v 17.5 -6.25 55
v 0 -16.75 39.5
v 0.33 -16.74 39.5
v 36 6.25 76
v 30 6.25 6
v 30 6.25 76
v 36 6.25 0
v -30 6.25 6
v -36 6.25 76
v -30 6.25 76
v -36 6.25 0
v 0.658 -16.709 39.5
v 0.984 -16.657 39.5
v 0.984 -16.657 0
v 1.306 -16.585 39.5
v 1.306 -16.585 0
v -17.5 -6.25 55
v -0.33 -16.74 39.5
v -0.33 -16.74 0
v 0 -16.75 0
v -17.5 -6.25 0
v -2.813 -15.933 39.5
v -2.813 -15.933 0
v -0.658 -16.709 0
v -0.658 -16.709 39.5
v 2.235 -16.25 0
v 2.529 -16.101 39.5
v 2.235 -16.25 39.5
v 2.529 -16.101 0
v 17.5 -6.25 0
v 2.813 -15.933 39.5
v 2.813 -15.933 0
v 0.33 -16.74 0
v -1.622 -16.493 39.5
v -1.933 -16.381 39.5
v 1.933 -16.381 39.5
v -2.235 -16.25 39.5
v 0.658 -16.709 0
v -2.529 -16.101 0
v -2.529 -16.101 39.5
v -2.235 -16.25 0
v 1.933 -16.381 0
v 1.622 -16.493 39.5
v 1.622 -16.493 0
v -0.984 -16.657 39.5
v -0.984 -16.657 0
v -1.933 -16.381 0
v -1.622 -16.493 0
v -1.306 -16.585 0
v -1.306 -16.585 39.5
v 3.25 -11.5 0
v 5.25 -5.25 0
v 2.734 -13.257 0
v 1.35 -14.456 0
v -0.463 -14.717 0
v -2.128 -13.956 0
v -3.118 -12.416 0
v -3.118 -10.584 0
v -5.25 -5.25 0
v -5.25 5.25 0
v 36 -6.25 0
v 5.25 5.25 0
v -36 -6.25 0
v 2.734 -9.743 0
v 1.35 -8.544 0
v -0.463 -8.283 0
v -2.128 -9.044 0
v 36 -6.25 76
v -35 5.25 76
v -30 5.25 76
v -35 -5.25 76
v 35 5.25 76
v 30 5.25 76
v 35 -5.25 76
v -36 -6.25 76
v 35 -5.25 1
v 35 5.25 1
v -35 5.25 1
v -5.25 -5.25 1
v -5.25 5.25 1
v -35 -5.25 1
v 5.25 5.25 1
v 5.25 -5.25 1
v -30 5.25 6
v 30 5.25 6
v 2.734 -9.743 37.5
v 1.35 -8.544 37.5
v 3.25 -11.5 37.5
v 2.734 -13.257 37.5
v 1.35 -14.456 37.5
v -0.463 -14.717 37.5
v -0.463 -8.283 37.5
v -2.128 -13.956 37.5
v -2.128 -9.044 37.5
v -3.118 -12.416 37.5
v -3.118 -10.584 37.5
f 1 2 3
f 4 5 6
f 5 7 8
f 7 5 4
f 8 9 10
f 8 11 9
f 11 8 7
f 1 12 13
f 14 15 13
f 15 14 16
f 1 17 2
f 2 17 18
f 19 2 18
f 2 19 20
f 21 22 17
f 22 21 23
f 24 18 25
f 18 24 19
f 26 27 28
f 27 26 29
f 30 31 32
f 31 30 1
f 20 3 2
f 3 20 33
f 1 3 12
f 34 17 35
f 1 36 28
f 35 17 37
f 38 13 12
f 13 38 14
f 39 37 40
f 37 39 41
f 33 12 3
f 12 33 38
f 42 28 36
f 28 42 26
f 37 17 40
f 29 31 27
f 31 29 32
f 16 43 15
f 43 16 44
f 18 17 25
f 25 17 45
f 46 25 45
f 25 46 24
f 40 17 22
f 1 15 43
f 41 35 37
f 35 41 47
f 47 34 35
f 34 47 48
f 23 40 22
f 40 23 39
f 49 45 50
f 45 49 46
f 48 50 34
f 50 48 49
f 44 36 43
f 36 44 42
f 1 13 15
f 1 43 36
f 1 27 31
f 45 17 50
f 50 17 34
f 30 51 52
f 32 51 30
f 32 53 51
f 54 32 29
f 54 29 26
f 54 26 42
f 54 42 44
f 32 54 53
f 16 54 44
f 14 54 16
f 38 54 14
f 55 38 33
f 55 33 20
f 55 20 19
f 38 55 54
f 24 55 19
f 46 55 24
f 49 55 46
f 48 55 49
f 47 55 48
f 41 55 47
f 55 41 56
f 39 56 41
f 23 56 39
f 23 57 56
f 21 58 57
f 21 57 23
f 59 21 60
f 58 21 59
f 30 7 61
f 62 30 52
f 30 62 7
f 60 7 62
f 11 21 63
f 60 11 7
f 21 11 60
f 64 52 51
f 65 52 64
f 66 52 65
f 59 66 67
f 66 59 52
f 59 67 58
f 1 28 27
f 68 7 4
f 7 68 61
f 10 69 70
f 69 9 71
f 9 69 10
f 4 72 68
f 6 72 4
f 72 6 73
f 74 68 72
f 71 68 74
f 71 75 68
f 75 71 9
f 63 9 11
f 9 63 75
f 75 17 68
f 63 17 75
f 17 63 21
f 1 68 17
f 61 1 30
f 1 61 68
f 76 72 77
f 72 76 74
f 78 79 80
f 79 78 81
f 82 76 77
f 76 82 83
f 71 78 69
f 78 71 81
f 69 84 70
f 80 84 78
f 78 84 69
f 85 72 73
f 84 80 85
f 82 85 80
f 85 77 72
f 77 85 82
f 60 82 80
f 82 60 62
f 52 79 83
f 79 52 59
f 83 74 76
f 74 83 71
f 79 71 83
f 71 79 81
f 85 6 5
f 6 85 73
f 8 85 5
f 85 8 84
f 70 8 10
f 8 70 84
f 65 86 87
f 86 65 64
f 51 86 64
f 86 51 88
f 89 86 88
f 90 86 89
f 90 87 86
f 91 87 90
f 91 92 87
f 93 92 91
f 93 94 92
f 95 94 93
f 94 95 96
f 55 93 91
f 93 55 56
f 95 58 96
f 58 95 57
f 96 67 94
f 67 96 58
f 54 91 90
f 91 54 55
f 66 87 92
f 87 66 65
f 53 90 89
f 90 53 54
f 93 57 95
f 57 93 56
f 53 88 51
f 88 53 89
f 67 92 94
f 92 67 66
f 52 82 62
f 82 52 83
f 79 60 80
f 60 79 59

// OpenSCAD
/* a phone-on-a-stick holder for a flame */
width=70;
depth=10.5;
height=75;
thickness=1;
flange=5;
shaft_dia=6.5;
shaft_thickness=2;
module holder(){
  difference() {
    union() {
      hull() {
        translate([0,(-(depth+2*thickness)/2)-(shaft_dia/2)-shaft_thickness, 0]) {
          cylinder(r=(shaft_dia/2)+shaft_thickness, h=(height/2)+shaft_thickness, $fn=100);
        }
        translate([-width/4, -(depth+2*thickness)/2,0]) cube([width/2, depth+2*thickness, (height/2)+(width/4)]);
      }
      translate([-(width+2*thickness)/2, -(depth+2*thickness)/2,0]) cube([width+2*thickness, depth+2*thickness, height+thickness]);
    }
    union() {
      translate([-width/2,-depth/2,thickness]) cube([width,depth,height]);
      translate([-(width-flange*2)/2,-depth/2,thickness+flange]) cube([width-2*flange, depth+thickness, height+flange]);
      translate([0,(-(depth+2*thickness)/2)-(shaft_dia/2)-shaft_thickness, 0]) {
        cylinder(r=(shaft_dia/2), h=height/2);
      }
      translate([-depth/2, -depth/2, 0]) cube([depth, depth, thickness]);
    }
  }
}

holder();
